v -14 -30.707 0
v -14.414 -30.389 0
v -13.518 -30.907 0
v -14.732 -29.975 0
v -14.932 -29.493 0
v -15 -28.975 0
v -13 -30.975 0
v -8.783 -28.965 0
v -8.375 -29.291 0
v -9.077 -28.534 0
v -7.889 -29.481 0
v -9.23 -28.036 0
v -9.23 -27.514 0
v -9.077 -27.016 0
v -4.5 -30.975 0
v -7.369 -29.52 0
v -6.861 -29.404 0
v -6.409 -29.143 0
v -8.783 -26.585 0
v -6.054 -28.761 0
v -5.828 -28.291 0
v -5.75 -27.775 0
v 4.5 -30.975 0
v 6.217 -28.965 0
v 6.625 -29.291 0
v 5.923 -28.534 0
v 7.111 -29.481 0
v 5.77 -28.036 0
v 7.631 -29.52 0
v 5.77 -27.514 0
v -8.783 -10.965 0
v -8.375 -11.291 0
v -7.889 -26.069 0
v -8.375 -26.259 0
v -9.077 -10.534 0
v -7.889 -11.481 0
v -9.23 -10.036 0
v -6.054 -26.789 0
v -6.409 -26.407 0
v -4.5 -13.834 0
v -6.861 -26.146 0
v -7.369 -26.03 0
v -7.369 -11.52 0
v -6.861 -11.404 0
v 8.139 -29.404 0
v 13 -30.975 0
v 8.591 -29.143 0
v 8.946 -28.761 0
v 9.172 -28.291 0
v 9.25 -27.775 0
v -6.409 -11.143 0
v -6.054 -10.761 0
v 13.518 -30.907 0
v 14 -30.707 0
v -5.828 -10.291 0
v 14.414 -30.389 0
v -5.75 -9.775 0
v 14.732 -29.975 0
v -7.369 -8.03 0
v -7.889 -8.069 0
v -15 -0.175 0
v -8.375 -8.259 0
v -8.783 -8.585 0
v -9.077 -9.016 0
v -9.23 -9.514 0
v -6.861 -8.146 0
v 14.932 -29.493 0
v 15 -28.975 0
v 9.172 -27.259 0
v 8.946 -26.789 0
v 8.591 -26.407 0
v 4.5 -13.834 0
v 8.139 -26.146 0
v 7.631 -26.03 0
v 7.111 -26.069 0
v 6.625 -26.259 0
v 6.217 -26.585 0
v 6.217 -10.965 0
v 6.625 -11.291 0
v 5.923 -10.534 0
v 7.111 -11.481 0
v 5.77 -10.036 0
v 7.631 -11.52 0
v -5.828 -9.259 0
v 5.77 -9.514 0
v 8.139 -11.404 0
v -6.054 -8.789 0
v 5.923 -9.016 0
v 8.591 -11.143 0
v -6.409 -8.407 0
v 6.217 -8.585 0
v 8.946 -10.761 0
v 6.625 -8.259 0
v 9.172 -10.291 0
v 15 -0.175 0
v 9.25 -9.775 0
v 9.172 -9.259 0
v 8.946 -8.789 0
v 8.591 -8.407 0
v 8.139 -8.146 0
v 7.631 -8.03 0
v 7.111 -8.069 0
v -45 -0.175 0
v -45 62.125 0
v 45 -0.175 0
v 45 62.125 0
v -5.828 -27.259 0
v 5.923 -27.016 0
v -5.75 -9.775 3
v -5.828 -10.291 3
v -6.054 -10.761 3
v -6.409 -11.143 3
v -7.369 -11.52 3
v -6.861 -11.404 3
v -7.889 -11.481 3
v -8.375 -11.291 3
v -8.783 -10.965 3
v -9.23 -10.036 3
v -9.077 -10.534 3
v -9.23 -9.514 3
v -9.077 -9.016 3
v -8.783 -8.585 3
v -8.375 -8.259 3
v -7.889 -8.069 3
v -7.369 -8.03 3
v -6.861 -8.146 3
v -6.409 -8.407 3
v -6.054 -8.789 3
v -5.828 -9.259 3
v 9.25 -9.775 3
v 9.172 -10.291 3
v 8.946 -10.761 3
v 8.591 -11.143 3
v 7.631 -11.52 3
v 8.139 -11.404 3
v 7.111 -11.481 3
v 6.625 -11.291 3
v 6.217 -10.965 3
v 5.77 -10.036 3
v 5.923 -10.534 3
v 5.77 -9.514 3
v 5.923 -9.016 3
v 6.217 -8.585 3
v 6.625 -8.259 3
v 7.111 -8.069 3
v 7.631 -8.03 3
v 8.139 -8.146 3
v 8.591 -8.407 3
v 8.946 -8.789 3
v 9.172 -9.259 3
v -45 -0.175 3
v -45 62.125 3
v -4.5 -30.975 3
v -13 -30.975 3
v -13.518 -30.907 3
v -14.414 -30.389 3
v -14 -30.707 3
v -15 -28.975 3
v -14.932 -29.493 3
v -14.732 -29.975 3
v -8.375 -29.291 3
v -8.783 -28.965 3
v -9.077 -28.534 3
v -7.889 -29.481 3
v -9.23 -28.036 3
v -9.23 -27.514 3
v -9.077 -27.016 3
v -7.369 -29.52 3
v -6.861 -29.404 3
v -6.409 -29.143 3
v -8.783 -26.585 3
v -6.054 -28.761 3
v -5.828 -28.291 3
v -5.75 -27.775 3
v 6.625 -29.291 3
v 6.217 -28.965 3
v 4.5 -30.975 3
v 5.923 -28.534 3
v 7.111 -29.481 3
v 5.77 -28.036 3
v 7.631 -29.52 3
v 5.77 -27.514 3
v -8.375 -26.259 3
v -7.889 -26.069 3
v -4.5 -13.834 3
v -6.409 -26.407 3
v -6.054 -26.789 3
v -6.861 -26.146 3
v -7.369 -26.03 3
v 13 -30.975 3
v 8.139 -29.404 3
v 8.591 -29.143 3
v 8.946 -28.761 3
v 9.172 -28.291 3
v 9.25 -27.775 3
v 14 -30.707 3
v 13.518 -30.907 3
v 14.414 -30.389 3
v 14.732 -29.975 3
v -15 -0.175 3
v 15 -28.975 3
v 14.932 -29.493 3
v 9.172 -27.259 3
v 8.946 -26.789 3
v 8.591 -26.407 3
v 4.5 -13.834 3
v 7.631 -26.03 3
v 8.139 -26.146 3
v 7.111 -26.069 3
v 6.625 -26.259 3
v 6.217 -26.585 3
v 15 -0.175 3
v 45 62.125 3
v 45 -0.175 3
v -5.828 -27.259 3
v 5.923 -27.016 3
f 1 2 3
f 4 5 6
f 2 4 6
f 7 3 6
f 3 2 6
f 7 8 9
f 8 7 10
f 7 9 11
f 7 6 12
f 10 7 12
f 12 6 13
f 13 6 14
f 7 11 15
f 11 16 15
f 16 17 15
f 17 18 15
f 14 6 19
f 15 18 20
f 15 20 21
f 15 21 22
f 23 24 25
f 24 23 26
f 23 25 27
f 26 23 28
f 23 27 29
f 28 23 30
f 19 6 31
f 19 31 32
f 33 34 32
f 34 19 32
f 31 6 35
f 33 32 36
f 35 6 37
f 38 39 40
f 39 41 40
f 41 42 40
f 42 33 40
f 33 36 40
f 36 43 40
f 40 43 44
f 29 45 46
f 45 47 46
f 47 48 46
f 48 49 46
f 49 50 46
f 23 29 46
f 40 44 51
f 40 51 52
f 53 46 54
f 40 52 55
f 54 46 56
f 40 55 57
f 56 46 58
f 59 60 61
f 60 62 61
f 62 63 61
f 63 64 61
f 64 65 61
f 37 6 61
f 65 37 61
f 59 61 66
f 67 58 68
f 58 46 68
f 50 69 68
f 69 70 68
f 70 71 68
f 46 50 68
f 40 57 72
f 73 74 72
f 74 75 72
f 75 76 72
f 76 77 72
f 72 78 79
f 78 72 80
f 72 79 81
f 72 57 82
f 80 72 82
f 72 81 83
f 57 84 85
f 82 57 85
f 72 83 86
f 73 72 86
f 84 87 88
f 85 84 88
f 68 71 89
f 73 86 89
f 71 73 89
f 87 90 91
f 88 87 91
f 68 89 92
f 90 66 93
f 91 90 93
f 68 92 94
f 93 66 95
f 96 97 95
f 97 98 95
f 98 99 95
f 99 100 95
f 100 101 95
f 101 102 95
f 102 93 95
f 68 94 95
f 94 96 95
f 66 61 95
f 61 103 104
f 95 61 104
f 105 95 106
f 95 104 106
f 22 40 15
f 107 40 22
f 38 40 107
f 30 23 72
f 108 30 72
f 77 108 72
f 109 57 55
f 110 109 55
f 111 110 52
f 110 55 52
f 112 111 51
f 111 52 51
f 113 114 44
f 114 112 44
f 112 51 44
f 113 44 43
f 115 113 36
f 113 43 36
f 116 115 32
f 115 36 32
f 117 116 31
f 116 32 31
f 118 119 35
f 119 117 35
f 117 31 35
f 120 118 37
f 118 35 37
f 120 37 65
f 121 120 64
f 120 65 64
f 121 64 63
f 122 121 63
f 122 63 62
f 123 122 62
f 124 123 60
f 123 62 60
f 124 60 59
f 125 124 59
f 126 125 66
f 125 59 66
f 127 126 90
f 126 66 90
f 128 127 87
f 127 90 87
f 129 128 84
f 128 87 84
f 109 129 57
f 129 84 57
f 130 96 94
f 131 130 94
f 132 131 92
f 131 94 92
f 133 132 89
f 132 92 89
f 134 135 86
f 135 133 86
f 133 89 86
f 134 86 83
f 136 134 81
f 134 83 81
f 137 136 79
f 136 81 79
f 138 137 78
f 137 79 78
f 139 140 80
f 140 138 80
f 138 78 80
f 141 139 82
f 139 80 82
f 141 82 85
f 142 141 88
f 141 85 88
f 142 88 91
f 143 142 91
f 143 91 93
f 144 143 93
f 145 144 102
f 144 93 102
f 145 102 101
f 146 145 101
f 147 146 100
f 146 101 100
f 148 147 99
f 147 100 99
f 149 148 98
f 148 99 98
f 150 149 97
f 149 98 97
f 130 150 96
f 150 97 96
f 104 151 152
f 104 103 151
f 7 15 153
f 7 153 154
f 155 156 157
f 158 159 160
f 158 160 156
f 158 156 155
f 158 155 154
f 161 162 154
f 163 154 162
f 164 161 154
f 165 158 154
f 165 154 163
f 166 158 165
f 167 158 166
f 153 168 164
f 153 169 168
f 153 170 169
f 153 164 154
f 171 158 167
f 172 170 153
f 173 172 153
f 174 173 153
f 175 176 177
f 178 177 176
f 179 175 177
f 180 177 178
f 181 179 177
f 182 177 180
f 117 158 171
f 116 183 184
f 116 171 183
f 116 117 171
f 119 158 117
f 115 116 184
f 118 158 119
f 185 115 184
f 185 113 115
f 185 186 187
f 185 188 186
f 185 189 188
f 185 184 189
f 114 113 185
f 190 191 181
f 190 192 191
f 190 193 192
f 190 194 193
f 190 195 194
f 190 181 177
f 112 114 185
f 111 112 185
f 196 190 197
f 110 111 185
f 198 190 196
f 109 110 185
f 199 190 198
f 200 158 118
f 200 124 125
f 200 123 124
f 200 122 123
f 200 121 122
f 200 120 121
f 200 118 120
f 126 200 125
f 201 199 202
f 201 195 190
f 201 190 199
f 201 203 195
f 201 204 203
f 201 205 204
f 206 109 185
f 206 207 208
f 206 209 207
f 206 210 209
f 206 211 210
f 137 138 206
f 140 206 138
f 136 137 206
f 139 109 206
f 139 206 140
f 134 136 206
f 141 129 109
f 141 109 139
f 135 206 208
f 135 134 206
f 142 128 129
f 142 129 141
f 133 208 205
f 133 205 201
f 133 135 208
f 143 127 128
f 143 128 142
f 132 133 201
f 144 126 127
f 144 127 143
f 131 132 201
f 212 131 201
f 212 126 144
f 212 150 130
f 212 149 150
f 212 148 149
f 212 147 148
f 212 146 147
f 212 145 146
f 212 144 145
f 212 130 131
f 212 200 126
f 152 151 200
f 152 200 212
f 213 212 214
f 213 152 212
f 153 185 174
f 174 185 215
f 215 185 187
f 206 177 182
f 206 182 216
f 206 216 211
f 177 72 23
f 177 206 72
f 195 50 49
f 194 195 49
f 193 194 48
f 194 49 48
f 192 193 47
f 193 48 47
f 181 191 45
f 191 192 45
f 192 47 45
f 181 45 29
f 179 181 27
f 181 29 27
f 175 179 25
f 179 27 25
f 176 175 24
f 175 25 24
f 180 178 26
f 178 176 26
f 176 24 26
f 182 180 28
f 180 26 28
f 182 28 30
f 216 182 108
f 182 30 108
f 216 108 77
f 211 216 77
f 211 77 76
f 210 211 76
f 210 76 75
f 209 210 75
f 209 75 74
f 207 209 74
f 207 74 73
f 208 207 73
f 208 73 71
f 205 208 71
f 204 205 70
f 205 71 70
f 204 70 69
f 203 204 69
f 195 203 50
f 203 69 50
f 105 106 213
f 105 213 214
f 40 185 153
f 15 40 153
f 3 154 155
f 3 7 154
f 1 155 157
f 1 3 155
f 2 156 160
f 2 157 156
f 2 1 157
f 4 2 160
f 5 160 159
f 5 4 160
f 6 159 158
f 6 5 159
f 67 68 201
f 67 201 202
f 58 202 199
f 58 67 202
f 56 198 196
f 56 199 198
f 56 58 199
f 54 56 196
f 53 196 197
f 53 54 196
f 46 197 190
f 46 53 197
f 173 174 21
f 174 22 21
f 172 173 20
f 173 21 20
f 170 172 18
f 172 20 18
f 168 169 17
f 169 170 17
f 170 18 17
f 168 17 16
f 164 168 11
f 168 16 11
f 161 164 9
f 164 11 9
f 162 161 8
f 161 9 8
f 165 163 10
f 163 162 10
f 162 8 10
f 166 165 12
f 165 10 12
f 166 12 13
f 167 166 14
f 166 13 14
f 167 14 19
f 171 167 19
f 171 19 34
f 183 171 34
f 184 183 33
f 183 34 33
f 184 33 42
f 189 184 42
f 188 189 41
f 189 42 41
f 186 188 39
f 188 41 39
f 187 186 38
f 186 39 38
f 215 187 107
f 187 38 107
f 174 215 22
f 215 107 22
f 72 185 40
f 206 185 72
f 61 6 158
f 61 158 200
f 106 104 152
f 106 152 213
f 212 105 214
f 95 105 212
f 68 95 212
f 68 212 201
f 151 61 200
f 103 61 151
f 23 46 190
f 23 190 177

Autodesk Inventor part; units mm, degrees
ref_plane "YZ Plane" through (0, 0, 0) normal (1, 0, 0) x (0, 1, 0)
ref_plane "XZ Plane" through (0, 0, 0) normal (0, 1, 0) x (-1, 0, 0)
ref_plane "XY Plane" through (0, 0, 0) normal (0, 0, 1) x (1, 0, 0)
sketch "Sketch1" plane through (0, 0, 0) normal (0, 0, 1) x (1, 0, 0)
  line L0 (-15, -28.975) -> (-15, -0.175) projected
  arc A0 (-15, -28.975) -> (-13, -30.975) centre (-13, -28.975) ccw projected
  line L1 (13, -30.975) -> (-13, -30.975) projected
  arc A1 (13, -30.975) -> (15, -28.975) centre (13, -28.975) ccw projected
  line L2 (15, -0.175) -> (15, -28.975) projected
  line L3 (45, -0.175) -> (15, -0.175) projected
  line L4 (45, 62.125) -> (45, -0.175) projected
  line L5 (-15, -0.175) -> (-45, -0.175) projected
  circle A2 centre (7.5, -27.775) radius 1.75 projected
  circle A3 centre (7.5, -9.775) radius 1.75 projected
  circle A4 centre (-7.5, -9.775) radius 1.75 projected
  circle A5 centre (-7.5, -27.775) radius 1.75 projected
  line L6 (-45, 62.125) -> (45, 62.125) projected
  line L7 (-45, -0.175) -> (-45, 62.125) projected
  point P0 (0, 0)
  point P1 (-45, 30.975)
extrude "Extrusion1" add sketch "Sketch1" along normal blind 1.5
sketch "Sketch2" plane through (0, 0, 1.5) normal (0, 0, 1) x (1, 0, 0)
  line L0 (-45, 30.975) -> (45, 30.975) projected
  line L1 (45, 62.125) -> (45, 30.975) projected
  line L2 (-45, 62.125) -> (45, 62.125) projected
  line L3 (-45, 30.975) -> (-45, 62.125) projected
  line L4 (15, -28.975) -> (15, -0.175) projected
  line L5 (15, -0.175) -> (45, -0.175) projected
  line L6 (45, -0.175) -> (45, 62.125) projected
  line L7 (-45, -0.175) -> (-15, -0.175) projected
  line L8 (-15, -0.175) -> (-15, -28.975) projected
  arc A0 (-15, -28.975) -> (-13, -30.975) centre (-13, -28.975) ccw projected
  line L9 (-13, -30.975) -> (13, -30.975) projected
  arc A1 (13, -30.975) -> (15, -28.975) centre (13, -28.975) ccw projected
  circle A2 centre (7.5, -27.775) radius 1.75 projected
  circle A3 centre (7.5, -9.775) radius 1.75 projected
  circle A4 centre (-7.5, -9.775) radius 1.75 projected
  circle A5 centre (-7.5, -27.775) radius 1.75 projected
  line L10 (45, 62.125) -> (-45, 62.125) projected
  line L11 (-45, 62.125) -> (-45, -0.175) projected
  point P0 (0, 0)
extrude "Extrusion2" add sketch "Sketch2" along normal blind 1.5
sketch "Sketch3" plane through (0, 0, 3) normal (0, 0, 1) x (1, 0, 0)
  line L0 (45, 62.125) -> (-45, 62.125) projected
  line L1 (-45, 62.125) -> (-45, -0.175) projected
  line L2 (-45, -0.175) -> (-15, -0.175) projected
  line L3 (-15, -0.175) -> (-15, -28.975) projected
  arc A0 (-15, -28.975) -> (-13, -30.975) centre (-13, -28.975) ccw projected
  line L4 (-13, -30.975) -> (13, -30.975) projected
  arc A1 (13, -30.975) -> (15, -28.975) centre (13, -28.975) ccw projected
  line L5 (15, -28.975) -> (15, -0.175) projected
  line L6 (15, -0.175) -> (45, -0.175) projected
  line L7 (45, -0.175) -> (45, 62.125) projected
  circle A2 centre (7.5, -27.775) radius 1.75 projected
  circle A3 centre (7.5, -9.775) radius 1.75 projected
  circle A4 centre (-7.5, -9.775) radius 1.75 projected
  circle A5 centre (-7.5, -27.775) radius 1.75 projected
  circle A6 centre (0, -18.775) radius 2.6186 projected
  line L8 (-13, -30.975) -> (13, -30.975) projected
  line L9 (0, -13.8344) -> (4.5, -13.8344)
  line L10 (4.5, -13.8344) -> (4.5, -30.975)
  line L11 (4.5, -30.975) -> (0, -30.975)
  line L12 (0, -30.975) -> (0, -13.8344)
  line L13 (0, -13.8344) -> (-4.5, -13.8344)
  line L14 (-4.5, -13.8344) -> (-4.5, -30.975)
  point P0 (0, 0)
  dimension "d4" = 4.5
extrude "Extrusion3" cut sketch "Sketch3" against normal through all contours L4 L12 A6 L9 L10 | L14 L13 L12 A6 L4 | L12 A6 | A6 L12
sketch "Sketch4" plane through (0, 0, 1.5) normal (0, 0, -1) x (-1, 0, 0)
  circle A0 centre (7.5, -27.775) radius 1.75 projected
  circle A1 centre (7.5, -9.775) radius 1.75 projected
  circle A2 centre (-7.5, -9.775) radius 1.75 projected
  circle A3 centre (-7.5, -27.775) radius 1.75 projected
  line L0 (4.5, -30.975) -> (4.5, -13.8344) projected
  line L1 (4.5, -13.8344) -> (-4.5, -13.8344) projected
  line L2 (-4.5, -13.8344) -> (-4.5, -30.975) projected
  line L3 (-4.5, -30.975) -> (-13, -30.975) projected
  arc A4 (-15, -28.975) -> (-13, -30.975) centre (-13, -28.975) ccw projected
  line L4 (-15, -28.975) -> (-15, -0.175) projected
  line L5 (-15, -0.175) -> (-45, -0.175) projected
  line L6 (-45, -0.175) -> (-45, 62.125) projected
  line L7 (-45, 62.125) -> (45, 62.125) projected
  line L8 (45, 62.125) -> (45, -0.175) projected
  line L9 (45, -0.175) -> (15, -0.175) projected
  line L10 (15, -0.175) -> (15, -28.975) projected
  arc A5 (13, -30.975) -> (15, -28.975) centre (13, -28.975) ccw projected
  line L11 (13, -30.975) -> (4.5, -30.975) projected
  line L12 (-45, 30.975) -> (45, 30.975) projected
  point P0 (0, 0)
extrude "Extrusion4" [suppressed]
properties part number "lead_1" material "Lead"
